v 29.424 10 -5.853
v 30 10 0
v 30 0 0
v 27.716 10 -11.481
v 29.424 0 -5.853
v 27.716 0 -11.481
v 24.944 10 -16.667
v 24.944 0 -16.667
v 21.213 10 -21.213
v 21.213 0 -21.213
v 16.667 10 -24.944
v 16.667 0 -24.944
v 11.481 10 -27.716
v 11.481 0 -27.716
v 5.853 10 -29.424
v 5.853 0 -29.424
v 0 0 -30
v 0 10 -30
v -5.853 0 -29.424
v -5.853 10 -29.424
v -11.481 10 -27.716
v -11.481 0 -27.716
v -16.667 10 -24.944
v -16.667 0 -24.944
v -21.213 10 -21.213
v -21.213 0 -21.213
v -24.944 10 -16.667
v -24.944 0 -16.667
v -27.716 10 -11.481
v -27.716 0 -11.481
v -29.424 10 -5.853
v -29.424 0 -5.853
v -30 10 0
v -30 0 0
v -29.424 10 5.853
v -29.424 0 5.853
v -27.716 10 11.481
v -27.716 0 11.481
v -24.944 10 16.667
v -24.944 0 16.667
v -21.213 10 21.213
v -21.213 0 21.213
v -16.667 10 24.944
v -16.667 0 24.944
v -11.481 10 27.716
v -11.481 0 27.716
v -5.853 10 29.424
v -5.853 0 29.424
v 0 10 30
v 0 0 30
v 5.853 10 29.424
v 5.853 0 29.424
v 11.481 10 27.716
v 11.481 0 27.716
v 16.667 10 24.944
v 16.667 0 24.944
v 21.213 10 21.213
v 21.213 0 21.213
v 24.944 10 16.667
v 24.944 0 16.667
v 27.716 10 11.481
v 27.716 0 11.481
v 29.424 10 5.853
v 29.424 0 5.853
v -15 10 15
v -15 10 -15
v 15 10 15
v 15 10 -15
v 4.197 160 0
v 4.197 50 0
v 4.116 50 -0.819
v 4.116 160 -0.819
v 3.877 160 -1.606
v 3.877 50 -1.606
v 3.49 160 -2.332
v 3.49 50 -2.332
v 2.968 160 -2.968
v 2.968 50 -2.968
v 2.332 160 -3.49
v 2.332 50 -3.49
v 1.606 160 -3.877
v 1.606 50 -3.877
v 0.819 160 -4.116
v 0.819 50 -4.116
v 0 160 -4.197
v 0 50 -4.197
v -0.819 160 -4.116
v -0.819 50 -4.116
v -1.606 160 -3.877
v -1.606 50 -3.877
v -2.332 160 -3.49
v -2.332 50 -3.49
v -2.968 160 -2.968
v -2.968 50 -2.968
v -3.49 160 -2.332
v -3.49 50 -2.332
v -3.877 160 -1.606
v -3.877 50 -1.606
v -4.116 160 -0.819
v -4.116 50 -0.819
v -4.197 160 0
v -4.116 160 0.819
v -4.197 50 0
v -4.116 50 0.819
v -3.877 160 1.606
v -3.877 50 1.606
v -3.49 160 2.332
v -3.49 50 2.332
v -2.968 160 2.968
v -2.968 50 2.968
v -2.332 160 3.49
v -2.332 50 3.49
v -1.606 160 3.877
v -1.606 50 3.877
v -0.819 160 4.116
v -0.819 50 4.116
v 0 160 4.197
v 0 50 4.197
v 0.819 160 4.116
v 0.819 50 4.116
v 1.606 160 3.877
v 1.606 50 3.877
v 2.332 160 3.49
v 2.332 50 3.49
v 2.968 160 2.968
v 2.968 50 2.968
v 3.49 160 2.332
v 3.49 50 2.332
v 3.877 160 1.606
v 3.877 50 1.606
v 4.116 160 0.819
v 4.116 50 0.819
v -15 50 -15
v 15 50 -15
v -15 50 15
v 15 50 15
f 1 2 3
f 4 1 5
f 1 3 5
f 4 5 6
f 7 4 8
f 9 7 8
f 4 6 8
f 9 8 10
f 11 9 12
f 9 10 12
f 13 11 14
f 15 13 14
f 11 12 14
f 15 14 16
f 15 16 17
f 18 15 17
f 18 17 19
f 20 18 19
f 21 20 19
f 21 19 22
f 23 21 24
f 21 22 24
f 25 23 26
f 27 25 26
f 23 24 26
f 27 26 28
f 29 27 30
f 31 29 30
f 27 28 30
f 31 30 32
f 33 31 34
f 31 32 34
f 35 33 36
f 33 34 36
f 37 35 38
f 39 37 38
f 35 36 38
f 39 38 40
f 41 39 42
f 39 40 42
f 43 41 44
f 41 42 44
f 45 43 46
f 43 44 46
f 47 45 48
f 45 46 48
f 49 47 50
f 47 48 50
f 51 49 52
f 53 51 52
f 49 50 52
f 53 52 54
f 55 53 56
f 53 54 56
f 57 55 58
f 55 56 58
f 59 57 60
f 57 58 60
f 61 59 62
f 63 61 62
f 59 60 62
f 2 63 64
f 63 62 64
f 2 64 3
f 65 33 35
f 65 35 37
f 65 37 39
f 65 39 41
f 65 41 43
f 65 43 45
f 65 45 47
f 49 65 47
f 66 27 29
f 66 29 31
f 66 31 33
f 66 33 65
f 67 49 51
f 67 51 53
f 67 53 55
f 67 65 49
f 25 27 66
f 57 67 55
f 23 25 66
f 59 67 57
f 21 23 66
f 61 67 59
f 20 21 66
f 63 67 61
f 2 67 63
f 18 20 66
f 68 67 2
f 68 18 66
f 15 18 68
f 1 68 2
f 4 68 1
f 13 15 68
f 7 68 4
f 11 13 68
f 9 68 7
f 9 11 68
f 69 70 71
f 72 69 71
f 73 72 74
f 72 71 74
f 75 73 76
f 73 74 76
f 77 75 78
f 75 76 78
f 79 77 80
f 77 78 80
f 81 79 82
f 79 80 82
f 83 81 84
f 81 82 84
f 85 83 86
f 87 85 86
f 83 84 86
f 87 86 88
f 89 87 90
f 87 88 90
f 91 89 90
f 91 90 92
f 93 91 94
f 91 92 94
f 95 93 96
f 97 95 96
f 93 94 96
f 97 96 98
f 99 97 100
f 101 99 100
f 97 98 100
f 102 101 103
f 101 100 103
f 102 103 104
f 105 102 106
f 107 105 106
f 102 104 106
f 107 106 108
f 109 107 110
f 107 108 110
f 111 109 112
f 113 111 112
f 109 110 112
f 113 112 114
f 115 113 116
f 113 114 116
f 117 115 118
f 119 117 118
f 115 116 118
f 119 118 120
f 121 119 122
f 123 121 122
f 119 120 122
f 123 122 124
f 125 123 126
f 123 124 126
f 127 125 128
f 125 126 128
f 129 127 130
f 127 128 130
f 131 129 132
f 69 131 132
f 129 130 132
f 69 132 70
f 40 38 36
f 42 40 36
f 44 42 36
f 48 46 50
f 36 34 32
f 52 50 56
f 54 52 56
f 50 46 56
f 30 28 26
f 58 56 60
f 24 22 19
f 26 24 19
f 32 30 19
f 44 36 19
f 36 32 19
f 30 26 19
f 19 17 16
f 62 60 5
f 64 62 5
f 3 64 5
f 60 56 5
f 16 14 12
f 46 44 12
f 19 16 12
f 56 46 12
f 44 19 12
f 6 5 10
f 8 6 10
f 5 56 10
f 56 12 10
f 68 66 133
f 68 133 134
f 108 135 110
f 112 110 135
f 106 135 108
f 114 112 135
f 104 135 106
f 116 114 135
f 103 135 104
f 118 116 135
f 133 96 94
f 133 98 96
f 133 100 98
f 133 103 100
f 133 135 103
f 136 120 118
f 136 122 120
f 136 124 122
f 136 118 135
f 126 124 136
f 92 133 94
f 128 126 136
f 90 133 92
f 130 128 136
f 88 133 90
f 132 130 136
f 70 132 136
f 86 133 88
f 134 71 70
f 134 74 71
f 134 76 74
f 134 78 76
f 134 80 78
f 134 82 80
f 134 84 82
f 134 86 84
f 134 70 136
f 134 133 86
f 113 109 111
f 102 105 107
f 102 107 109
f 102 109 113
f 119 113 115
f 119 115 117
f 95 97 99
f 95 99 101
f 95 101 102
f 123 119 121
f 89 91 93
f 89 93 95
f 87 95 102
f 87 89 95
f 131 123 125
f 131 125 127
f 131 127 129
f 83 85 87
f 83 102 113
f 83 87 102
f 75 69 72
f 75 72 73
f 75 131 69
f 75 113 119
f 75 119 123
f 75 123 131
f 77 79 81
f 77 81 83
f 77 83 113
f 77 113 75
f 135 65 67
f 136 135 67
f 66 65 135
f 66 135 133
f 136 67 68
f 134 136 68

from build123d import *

# Parameters (mm, degrees)
SKETCH1_R           = 30
BOSS_EXTRUDE1_DEPTH = 10
SKETCH2_W           = 30
SKETCH2_H           = 30
BOSS_EXTRUDE2_DEPTH = 40
SKETCH3_R           = 4.196967066
BOSS_EXTRUDE3_DEPTH = 110


with BuildPart() as part:
    # Sketch1 → Boss-Extrude1 (new body)
    with BuildSketch(Plane(origin=(0, 0, 0), x_dir=(1, 0, 0), z_dir=(0, 1, 0))):
        Circle(SKETCH1_R)
    extrude(amount=BOSS_EXTRUDE1_DEPTH)

    # Sketch2 → Boss-Extrude2 (add)
    with BuildSketch(Plane(origin=(0, 10, 0), x_dir=(1, 0, 0), z_dir=(0, 1, 0))):
        Rectangle(SKETCH2_W, SKETCH2_H)
    extrude(amount=BOSS_EXTRUDE2_DEPTH)

    # Sketch3 → Boss-Extrude3 (add)
    with BuildSketch(Plane(origin=(0, 50, 0), x_dir=(1, 0, 0), z_dir=(0, 1, 0))):
        Circle(SKETCH3_R)
    extrude(amount=BOSS_EXTRUDE3_DEPTH)


solid = part.part
